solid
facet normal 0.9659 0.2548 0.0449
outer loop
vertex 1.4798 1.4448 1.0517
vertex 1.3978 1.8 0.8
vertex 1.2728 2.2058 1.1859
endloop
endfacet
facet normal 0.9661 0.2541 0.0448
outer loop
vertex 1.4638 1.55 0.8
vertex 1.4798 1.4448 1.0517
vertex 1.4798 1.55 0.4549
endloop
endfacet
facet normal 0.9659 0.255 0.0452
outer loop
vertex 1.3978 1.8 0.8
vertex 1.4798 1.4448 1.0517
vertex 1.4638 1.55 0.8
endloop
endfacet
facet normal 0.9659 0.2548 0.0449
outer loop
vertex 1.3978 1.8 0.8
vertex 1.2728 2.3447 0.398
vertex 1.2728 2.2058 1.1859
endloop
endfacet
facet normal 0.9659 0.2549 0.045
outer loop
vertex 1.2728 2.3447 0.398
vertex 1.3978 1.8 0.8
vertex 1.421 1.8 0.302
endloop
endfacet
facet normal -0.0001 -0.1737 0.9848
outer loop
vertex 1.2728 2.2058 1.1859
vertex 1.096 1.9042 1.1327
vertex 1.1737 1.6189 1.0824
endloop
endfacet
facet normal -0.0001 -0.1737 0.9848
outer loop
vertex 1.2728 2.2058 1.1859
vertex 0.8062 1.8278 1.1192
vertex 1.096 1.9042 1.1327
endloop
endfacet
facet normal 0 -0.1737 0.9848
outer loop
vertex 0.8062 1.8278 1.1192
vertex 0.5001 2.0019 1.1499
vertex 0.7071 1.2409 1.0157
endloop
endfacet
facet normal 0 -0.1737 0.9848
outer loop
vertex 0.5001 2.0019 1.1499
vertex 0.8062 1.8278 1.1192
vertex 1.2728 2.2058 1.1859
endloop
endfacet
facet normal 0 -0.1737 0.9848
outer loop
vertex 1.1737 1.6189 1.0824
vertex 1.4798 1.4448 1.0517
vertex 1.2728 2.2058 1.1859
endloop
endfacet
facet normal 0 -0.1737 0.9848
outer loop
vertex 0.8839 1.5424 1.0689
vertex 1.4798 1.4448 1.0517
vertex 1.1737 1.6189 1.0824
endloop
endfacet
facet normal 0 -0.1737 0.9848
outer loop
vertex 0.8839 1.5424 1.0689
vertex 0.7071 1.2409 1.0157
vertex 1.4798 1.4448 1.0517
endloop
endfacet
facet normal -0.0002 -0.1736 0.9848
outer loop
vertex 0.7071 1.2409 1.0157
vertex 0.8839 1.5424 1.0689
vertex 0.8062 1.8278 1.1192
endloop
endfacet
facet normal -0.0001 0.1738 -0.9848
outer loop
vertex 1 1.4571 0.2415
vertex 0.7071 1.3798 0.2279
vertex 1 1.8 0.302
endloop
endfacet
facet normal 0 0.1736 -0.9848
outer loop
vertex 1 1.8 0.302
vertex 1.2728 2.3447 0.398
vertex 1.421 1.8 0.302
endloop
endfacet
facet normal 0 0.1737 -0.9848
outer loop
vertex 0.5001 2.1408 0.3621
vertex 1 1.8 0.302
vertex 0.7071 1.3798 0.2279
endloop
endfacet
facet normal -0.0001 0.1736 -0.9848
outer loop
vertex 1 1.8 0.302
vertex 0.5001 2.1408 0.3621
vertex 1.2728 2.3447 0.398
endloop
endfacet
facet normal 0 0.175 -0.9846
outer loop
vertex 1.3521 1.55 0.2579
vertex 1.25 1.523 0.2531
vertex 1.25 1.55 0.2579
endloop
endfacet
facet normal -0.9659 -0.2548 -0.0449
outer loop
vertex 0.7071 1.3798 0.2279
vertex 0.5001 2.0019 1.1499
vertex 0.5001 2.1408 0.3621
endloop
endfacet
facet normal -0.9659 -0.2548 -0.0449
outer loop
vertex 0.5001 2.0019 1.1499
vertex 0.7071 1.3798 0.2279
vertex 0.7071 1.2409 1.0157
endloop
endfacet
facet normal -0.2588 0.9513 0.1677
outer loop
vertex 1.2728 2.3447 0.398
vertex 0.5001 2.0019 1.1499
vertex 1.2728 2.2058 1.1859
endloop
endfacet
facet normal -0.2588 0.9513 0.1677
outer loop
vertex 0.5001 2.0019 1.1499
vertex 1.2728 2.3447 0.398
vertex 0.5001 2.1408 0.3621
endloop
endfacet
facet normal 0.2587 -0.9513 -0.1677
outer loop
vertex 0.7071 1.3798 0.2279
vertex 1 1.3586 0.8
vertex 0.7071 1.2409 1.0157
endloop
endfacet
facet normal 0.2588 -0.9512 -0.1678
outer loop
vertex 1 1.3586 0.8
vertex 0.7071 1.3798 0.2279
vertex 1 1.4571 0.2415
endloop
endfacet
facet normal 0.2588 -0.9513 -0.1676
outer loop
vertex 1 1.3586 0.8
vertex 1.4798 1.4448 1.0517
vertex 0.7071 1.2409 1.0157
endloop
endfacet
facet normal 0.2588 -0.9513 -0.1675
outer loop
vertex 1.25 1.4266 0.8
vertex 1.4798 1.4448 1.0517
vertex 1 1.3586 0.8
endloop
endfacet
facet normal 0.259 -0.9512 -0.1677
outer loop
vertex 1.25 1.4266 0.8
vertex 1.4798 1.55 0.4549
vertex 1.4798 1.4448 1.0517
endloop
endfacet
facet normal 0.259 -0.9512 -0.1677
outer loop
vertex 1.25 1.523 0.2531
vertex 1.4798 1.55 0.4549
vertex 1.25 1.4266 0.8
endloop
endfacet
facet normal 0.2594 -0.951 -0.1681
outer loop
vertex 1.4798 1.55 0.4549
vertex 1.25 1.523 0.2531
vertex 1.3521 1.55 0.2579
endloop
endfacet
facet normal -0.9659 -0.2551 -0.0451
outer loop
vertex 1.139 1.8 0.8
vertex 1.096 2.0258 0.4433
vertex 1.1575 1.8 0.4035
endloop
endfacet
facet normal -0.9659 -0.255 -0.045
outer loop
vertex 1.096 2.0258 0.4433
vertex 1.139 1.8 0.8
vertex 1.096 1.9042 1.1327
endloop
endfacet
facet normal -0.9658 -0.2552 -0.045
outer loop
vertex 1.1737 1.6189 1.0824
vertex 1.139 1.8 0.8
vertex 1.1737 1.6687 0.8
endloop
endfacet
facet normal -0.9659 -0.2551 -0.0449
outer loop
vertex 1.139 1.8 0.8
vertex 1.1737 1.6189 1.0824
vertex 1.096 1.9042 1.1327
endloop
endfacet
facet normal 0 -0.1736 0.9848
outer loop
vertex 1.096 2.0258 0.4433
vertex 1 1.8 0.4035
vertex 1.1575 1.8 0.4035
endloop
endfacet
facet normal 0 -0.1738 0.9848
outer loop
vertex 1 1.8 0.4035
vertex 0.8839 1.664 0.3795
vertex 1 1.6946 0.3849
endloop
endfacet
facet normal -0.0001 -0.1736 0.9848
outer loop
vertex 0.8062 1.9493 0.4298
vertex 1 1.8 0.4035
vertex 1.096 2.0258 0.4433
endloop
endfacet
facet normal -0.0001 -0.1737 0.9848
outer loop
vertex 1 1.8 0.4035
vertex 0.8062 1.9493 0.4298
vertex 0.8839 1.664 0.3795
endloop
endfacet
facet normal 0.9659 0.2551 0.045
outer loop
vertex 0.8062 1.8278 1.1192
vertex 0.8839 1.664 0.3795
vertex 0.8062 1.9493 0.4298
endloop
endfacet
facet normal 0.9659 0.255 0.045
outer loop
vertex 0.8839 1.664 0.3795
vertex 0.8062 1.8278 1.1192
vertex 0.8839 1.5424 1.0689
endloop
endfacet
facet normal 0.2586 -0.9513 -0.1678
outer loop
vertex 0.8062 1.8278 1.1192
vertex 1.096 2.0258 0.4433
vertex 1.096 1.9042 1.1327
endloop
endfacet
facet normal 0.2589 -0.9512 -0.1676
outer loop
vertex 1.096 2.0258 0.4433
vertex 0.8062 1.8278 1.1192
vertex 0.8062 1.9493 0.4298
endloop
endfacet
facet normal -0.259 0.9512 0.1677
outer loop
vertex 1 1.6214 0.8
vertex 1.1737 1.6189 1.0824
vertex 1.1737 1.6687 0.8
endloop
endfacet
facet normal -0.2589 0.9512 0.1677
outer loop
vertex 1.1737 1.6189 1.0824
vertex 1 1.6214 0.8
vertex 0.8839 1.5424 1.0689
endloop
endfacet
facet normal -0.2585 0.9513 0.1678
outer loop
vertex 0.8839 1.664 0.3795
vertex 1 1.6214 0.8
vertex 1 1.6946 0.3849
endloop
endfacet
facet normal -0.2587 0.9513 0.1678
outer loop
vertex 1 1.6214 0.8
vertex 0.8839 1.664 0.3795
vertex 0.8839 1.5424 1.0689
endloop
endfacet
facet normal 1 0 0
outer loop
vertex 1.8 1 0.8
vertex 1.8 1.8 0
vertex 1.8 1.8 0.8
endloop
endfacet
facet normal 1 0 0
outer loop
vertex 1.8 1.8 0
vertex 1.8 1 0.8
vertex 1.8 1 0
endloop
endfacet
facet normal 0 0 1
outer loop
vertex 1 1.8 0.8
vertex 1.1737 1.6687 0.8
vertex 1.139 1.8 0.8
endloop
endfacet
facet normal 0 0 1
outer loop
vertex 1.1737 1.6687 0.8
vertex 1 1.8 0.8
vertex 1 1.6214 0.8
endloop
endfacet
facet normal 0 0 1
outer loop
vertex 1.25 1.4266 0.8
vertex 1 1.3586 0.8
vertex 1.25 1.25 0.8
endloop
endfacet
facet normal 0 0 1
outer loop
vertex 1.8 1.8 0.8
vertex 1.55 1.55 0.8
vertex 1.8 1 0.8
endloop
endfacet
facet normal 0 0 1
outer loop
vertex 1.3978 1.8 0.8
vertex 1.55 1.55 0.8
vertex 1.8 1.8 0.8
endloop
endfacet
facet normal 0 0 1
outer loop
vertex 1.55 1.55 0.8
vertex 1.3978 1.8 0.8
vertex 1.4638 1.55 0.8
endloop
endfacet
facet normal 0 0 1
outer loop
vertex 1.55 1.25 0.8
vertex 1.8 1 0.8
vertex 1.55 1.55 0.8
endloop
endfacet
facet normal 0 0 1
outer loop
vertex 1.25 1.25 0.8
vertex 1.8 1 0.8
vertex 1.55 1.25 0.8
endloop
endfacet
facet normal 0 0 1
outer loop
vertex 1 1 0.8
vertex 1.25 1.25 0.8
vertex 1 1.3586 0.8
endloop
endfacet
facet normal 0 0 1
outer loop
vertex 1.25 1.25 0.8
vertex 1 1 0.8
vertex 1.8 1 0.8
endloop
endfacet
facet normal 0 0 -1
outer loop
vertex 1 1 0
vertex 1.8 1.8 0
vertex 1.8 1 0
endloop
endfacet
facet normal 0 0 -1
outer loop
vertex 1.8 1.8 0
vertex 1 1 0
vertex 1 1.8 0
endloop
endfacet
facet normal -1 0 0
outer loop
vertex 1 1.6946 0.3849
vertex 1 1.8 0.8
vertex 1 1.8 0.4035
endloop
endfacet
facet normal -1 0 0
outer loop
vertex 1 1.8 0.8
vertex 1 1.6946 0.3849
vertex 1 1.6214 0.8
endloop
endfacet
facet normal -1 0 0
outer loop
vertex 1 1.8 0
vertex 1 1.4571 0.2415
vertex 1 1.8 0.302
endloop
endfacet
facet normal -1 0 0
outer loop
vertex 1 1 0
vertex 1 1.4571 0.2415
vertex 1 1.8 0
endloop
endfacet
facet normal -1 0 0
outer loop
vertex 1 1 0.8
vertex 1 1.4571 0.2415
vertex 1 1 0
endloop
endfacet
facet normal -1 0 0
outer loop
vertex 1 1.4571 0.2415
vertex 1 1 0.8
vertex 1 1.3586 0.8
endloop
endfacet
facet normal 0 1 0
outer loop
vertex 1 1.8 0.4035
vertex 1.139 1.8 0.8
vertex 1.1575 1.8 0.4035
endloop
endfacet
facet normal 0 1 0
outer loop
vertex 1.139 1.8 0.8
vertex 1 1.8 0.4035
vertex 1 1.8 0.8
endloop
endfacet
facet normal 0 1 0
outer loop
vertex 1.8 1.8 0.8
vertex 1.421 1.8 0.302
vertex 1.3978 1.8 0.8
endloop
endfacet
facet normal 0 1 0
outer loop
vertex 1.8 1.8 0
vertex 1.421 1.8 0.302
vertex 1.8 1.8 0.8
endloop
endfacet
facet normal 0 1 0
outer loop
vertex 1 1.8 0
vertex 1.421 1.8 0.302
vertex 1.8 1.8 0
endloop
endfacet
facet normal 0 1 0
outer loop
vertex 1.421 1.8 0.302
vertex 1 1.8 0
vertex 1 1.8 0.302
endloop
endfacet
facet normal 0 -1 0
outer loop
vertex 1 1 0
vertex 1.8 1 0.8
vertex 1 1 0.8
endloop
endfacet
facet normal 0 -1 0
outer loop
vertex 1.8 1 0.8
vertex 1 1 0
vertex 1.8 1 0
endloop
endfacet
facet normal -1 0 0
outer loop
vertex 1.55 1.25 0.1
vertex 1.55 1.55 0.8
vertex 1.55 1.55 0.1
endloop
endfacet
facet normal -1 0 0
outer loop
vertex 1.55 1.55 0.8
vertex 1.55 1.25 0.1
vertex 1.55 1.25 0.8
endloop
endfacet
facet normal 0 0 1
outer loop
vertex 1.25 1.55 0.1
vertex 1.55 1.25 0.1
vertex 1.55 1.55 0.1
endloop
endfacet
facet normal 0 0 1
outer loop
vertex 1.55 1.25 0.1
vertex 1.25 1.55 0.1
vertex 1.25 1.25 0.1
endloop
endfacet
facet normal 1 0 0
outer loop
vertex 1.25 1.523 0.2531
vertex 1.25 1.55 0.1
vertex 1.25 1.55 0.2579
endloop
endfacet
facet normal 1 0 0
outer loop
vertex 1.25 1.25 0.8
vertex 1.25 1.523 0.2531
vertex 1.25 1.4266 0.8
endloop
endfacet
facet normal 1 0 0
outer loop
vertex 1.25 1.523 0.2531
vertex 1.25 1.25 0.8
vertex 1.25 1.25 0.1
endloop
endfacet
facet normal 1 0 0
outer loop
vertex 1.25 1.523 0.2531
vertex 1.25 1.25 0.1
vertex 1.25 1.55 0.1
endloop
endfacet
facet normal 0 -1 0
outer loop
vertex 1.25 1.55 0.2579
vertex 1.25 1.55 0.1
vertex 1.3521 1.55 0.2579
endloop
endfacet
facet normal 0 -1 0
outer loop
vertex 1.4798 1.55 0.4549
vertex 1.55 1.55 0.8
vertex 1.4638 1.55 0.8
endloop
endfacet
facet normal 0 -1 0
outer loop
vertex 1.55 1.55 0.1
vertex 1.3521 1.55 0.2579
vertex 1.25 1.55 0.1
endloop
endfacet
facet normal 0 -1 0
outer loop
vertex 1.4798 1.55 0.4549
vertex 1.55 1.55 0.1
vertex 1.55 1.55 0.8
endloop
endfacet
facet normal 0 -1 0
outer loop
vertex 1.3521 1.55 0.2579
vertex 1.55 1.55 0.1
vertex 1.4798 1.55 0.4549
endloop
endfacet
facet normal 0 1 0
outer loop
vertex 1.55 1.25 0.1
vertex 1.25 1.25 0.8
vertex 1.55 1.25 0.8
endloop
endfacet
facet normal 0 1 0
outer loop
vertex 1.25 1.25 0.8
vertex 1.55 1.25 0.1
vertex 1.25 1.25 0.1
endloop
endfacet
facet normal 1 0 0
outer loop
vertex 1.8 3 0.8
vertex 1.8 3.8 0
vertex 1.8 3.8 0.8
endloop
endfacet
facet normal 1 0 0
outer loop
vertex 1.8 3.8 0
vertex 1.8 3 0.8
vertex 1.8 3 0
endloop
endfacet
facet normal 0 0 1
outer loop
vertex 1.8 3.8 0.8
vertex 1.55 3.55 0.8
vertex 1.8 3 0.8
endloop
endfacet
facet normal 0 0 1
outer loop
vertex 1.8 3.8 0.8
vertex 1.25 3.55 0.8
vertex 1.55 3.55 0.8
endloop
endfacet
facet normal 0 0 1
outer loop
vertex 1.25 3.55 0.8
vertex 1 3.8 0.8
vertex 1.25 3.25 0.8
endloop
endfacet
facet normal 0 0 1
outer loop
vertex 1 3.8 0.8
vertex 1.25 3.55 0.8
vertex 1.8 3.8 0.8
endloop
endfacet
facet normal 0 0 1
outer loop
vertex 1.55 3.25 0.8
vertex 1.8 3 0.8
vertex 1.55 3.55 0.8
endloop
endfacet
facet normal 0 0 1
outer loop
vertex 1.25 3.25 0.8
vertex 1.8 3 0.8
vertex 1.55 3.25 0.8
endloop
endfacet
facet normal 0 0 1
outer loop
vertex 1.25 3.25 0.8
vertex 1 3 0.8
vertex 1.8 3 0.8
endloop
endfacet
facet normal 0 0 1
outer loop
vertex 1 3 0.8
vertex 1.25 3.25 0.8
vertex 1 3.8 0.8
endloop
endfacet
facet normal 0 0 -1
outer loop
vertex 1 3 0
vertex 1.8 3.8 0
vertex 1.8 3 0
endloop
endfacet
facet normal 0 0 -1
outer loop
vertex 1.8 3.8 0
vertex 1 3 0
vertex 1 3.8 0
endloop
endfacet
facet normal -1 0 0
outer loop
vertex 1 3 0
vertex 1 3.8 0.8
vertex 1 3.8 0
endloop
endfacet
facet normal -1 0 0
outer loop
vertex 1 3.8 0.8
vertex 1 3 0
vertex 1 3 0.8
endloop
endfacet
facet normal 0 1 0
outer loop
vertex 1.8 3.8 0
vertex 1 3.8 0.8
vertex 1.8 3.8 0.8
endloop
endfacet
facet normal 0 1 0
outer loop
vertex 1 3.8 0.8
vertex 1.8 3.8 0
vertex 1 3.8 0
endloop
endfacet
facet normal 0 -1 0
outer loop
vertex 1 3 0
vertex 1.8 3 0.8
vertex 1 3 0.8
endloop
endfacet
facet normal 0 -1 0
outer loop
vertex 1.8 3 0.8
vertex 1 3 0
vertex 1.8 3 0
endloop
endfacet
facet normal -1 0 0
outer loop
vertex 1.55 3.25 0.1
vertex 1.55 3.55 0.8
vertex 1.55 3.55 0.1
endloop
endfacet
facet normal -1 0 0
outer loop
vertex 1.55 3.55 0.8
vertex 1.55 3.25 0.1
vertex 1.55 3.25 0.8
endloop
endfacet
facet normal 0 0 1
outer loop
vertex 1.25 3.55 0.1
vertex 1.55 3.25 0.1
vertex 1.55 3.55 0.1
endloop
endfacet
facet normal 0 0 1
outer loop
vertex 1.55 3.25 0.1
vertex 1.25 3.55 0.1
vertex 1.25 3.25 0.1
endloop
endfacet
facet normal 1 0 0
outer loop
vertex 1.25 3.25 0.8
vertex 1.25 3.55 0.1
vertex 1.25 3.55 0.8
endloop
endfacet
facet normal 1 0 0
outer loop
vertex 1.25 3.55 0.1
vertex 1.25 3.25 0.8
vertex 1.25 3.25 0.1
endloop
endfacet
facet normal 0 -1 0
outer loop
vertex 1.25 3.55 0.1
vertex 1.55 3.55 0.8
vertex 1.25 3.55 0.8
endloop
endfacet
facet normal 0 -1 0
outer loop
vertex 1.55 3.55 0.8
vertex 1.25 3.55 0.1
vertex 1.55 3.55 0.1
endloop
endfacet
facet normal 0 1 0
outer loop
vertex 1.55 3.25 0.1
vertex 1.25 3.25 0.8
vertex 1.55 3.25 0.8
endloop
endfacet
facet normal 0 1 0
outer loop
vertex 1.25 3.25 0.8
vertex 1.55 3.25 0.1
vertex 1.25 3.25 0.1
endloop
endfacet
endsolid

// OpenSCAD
// file: keyboard_lib_2.scad
module key(position = [ 0, 0 ], dimensions = [ 1, 1 ]) {
    x_offset = position[0];
    y_offset = position[1];

    x_size = dimensions[0];
    y_size = dimensions[1];

    translate([ x_offset, y_offset, 0 ]) {
        difference() {
            cube([ x_size * 0.8, y_size * 0.8, 1 * 0.8 ]);
            translate([ x_size * 0.25, y_size * 0.25, 0.1 ]) {
                cube([ x_size * 0.3, y_size * 0.3, 1 * 0.9 ]);
            }
        }
    }
}

module section(rowlist, tilt_angle, rotation_angle, rotation_center) {
    translate(rot_center) {
        rotate(tilt_angle, [ 1, 0, 0 ]) {
            rotate(rot_angle, [ 0, 0, 1 ]) {
                translate(-rot_center) {
                    for (row = rowlist) {
                        for (key_arr = row) {
                            key(position = key_arr[0],
                                position = key_arr[1]);
                        }
                    }
                }
            }
        }
    }
}

section(
    rowlist =
        [
            [
                [
                    [ 0, 0 ], // row-start-relative position
                    [ 1, 1 ]  // dimensions height/width
                ],            // key 1
                [
                    [ 0, 0 ], // row-start-relative position
                    [ 1, 1 ]  // dimensions height/width
                ],            // key 2
            ],                // row 1
            [
                [
                    [ 0, 0 ], // row-start-relative position
                    [ 1, 1 ]  // dimensions height/width
                ],            // key 1
                [
                    [ 0, 0 ], // row-start-relative position
                    [ 1, 1 ]  // dimensions height/width
                ],            // key 2
            ]                 // row 2
        ],
    tilt_angle = 10,
    rot_angle  = 15,
    rot_center = [ 0, 0, 1 ]);
// main file
include<keyboard_lib_2.scad> //
    section(
        rowlist =
            [
                [
                    [
                        [ 0, 0, 0 ],      // position
                        [ 1.0, 1.0, 1.0 ] // size
                    ],                    // key
                    [
                        [ 0, 0, 0 ],      // position
                        [ 1.0, 1.0, 1.0 ] // size
                    ],                    // key
                ],                        // row

                [
                    [
                        [ 0, 0, 0 ],      // position
                        [ 1.0, 1.0, 1.0 ] // size
                    ],                    // key
                    [
                        [ 0, 0, 0 ],      // position
                        [ 1.0, 1.0, 1.0 ] // size
                    ],                    // key
                ],                        // row
            ],                            // rowlist
        tilt_angle = 0,
        rot_angle  = [ 0, 0, 0 ],
        rot_center = [ 0, 0, 0 ]);

section(
    rowlist =
        [
            [
                [
                    [ 0, 0, 0 ],      // position
                    [ 1.0, 1.0, 1.0 ] // size
                ],                    // key
                [
                    [ 0, 0, 0 ],    // position
                    [ 1.0, 3, 1.0 ] // size
                ],                  // key
            ],                      // row
        ],                          // rowlist
    tilt_angle = 0,
    rot_angle  = [ 0, 0, 0 ],
    rot_center = [ 0, 0, 0 ]);
